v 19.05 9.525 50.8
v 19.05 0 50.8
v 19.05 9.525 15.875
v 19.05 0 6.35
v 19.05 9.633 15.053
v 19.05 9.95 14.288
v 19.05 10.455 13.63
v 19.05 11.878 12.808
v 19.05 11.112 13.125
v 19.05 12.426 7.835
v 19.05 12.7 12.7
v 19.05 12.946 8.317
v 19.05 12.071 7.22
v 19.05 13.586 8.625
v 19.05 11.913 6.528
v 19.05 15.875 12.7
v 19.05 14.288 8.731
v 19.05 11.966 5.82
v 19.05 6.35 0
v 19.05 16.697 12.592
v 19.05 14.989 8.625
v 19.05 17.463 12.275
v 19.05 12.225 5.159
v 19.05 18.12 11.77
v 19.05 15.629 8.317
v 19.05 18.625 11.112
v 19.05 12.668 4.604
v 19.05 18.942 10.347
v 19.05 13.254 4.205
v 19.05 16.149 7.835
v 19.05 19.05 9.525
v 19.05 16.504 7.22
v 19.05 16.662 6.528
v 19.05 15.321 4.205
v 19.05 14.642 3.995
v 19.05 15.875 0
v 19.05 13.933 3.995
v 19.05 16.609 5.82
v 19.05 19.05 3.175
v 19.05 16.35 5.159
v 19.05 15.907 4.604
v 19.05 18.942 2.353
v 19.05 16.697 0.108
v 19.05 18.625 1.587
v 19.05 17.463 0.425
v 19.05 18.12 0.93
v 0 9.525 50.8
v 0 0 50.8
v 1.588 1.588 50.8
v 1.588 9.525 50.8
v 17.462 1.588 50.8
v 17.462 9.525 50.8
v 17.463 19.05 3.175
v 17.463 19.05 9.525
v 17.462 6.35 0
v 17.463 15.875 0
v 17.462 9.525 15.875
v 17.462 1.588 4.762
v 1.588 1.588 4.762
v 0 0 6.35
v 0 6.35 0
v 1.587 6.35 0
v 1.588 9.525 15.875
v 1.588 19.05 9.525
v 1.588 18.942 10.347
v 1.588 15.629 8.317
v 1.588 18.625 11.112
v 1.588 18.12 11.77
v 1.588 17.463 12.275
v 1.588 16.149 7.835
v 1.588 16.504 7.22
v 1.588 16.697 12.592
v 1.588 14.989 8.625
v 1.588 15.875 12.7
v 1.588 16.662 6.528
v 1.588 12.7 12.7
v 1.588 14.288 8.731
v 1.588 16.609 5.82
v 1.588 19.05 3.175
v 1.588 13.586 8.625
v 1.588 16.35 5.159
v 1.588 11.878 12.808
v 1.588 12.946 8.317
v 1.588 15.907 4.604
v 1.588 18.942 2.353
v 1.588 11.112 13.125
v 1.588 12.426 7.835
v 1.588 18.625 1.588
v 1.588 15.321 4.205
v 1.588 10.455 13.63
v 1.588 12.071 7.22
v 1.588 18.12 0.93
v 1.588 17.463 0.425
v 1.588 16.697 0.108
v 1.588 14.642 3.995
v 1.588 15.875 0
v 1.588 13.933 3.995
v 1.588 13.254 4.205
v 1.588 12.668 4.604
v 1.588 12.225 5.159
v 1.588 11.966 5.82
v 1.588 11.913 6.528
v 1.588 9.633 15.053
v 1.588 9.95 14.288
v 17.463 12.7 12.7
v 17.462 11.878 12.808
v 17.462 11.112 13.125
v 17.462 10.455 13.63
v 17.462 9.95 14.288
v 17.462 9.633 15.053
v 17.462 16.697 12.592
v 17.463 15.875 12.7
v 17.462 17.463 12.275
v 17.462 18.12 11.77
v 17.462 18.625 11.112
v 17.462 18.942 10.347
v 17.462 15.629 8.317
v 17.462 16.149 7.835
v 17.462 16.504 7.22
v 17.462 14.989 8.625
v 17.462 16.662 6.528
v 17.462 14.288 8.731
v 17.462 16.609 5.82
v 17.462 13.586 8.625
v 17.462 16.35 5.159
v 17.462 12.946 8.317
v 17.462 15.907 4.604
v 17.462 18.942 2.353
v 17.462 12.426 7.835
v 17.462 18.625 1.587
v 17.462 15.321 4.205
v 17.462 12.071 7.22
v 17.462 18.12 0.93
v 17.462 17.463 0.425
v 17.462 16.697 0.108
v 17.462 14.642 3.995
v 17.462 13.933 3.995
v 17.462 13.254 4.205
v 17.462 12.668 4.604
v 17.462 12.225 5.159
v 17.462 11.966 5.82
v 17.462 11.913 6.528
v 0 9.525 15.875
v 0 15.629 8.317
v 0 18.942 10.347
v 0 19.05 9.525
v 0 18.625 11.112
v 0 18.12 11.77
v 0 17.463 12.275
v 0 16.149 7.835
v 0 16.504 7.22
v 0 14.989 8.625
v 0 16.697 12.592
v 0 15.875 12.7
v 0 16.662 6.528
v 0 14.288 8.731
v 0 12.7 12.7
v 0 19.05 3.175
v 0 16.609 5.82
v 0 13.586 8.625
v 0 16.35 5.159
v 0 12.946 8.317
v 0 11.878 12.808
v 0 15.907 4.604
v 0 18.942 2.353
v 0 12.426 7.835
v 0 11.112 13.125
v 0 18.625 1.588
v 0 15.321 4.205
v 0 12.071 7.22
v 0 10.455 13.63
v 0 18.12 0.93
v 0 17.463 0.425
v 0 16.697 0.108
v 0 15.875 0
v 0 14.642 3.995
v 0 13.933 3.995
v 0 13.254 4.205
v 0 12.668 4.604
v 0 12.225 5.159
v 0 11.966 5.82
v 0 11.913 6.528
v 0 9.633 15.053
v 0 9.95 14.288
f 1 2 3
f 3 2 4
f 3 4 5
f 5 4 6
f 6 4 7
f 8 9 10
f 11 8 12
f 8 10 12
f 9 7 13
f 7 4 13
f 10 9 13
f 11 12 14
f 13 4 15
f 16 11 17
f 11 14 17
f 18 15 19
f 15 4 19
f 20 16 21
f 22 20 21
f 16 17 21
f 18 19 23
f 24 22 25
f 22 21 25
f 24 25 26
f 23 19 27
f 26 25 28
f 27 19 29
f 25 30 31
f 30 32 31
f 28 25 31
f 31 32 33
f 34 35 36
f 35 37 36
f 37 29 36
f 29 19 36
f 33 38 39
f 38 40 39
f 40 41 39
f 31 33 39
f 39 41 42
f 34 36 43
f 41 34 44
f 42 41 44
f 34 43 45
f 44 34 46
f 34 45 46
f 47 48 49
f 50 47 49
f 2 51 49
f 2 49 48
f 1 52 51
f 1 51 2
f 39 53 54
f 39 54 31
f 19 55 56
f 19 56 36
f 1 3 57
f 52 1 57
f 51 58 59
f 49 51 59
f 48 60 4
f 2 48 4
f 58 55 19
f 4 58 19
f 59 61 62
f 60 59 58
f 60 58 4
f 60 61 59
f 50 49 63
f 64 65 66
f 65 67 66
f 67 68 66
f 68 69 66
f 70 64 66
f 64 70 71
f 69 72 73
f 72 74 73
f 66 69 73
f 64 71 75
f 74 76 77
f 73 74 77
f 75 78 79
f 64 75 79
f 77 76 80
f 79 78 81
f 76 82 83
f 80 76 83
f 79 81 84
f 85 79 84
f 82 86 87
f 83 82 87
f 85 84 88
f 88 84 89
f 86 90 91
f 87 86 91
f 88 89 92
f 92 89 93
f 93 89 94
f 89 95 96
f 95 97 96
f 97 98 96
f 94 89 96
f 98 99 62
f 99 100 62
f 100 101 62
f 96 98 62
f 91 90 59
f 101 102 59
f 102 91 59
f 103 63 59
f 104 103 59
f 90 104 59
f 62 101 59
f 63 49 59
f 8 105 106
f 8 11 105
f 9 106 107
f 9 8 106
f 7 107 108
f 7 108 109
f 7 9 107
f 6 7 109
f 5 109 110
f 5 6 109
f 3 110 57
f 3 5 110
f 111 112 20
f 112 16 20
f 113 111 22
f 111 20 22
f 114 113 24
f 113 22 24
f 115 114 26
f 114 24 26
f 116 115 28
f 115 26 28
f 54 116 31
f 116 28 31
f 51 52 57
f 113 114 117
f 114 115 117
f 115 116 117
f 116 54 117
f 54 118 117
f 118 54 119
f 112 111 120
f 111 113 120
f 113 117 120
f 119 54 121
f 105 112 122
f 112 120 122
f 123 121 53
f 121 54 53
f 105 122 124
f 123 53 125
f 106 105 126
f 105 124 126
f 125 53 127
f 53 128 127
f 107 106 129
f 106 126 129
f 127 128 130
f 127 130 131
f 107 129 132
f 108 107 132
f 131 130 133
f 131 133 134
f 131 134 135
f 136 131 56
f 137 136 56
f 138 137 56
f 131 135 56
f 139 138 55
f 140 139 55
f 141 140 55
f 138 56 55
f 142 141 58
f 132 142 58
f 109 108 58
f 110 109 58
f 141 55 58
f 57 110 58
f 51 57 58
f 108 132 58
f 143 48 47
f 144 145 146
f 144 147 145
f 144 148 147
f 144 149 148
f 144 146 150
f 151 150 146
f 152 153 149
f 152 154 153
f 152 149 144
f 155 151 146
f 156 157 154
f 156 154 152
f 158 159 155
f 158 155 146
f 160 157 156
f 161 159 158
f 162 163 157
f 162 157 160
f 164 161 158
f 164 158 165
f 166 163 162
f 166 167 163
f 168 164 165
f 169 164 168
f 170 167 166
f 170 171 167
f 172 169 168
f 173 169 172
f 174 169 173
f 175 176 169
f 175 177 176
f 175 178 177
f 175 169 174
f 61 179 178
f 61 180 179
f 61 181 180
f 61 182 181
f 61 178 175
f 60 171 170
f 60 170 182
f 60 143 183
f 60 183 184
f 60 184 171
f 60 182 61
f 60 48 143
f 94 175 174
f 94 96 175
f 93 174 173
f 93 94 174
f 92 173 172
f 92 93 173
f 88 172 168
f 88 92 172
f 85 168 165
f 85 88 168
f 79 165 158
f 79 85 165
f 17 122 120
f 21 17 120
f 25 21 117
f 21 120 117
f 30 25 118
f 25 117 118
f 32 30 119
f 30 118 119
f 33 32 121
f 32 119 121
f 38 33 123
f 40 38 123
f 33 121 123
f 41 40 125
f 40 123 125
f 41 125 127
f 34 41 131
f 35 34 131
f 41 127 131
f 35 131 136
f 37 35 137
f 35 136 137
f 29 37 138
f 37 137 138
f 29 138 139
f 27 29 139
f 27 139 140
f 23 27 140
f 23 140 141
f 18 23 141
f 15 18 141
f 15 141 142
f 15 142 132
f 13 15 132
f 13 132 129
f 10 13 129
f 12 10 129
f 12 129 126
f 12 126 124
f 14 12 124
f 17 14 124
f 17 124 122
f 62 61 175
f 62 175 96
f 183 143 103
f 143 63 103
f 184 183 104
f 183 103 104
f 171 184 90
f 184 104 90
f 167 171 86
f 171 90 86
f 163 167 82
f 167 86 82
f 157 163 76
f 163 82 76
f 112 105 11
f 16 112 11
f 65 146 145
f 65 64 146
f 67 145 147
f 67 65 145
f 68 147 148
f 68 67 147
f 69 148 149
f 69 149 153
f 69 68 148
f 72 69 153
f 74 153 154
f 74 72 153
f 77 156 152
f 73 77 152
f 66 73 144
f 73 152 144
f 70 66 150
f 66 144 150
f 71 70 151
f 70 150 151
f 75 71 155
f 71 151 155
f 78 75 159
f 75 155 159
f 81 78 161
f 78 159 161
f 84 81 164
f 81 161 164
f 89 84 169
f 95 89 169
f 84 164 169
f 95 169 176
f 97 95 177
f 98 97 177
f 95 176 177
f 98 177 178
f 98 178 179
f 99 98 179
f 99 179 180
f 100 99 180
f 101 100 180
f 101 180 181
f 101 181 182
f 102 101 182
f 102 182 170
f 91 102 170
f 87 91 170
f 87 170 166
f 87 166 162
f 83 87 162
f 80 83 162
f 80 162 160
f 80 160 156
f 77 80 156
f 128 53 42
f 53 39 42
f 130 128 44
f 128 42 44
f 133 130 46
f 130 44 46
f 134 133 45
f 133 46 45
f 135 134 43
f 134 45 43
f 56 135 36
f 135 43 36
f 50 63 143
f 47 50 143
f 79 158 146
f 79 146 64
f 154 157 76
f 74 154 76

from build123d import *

# Parameters (mm, degrees)
BOSS_EXTRUDE1_DEPTH            = 50.8
SKETCH4_W                      = 1.5875
SKETCH4_H                      = 12.7
BOSS_EXTRUDE2_DEPTH            = 9.525
FILLET2_R                      = 3.175
F_3_16_0_1875_DIAMETER_HOLE1_D = 4.7625
CHAMFER1_SIZE                  = 6.35


with BuildPart() as part:
    # Sketch1 → Boss-Extrude1 (new body)
    with BuildSketch(Plane.XY):
        Polygon((17.4625, 9.525), (17.4625, 1.5875), (1.5875, 1.5875), (1.5875, 9.525), (0, 9.525), (0, 0), (19.05, 0), (19.05, 9.525), align=None)
    extrude(amount=BOSS_EXTRUDE1_DEPTH)

    # Sketch4 → Boss-Extrude2 (add)
    with BuildSketch(Plane(origin=(0, 9.525, 0), x_dir=(1, 0, 0), z_dir=(0, 1, 0))):
        with Locations((0.79375, -6.35)):
            Rectangle(SKETCH4_W, SKETCH4_H)
        with Locations((18.25625, -6.35)):
            Rectangle(SKETCH4_W, SKETCH4_H)
    extrude(amount=BOSS_EXTRUDE2_DEPTH)

    # Fillet2
    fillet2_edges = [part.edges().sort_by_distance(p)[0] for p in [
        (0.79375, 9.525, 12.7),
        (0.79375, 19.05, 12.7),
        (0.79375, 19.05, 0),
        (18.25625, 9.525, 12.7),
        (18.25625, 19.05, 12.7),
        (18.25625, 19.05, 0),
    ]]
    fillet(fillet2_edges, radius=FILLET2_R)

    # 3/16 (0.1875) Diameter Hole1 (through all)
    with Locations(Plane(origin=(19.05, 0, 0), x_dir=(0, 0, -1), z_dir=(1, 0, 0))):
        with Locations((-6.35, 14.2875), (4.115757827, 15.875)):
            Hole(F_3_16_0_1875_DIAMETER_HOLE1_D / 2)

    # Chamfer1
    # the kernel refuses this chamfer: 6.35 mm, written as the material it takes off along each edge
    with BuildSketch(Plane(origin=(-16.330186974, 0, 0), x_dir=(0, 0.9996219169112966, -0.02749587661058637), z_dir=(1, 0, 0))) as chamfer1_piece_1:
        Polygon((CHAMFER1_SIZE * 0.999621916911, CHAMFER1_SIZE * 0.0274958766106), (-CHAMFER1_SIZE * 0.0274958766106, CHAMFER1_SIZE * 0.999621916911), (0, 0), align=None)
    extrude(amount=51.710373947, mode=Mode.SUBTRACT)


solid = part.part
